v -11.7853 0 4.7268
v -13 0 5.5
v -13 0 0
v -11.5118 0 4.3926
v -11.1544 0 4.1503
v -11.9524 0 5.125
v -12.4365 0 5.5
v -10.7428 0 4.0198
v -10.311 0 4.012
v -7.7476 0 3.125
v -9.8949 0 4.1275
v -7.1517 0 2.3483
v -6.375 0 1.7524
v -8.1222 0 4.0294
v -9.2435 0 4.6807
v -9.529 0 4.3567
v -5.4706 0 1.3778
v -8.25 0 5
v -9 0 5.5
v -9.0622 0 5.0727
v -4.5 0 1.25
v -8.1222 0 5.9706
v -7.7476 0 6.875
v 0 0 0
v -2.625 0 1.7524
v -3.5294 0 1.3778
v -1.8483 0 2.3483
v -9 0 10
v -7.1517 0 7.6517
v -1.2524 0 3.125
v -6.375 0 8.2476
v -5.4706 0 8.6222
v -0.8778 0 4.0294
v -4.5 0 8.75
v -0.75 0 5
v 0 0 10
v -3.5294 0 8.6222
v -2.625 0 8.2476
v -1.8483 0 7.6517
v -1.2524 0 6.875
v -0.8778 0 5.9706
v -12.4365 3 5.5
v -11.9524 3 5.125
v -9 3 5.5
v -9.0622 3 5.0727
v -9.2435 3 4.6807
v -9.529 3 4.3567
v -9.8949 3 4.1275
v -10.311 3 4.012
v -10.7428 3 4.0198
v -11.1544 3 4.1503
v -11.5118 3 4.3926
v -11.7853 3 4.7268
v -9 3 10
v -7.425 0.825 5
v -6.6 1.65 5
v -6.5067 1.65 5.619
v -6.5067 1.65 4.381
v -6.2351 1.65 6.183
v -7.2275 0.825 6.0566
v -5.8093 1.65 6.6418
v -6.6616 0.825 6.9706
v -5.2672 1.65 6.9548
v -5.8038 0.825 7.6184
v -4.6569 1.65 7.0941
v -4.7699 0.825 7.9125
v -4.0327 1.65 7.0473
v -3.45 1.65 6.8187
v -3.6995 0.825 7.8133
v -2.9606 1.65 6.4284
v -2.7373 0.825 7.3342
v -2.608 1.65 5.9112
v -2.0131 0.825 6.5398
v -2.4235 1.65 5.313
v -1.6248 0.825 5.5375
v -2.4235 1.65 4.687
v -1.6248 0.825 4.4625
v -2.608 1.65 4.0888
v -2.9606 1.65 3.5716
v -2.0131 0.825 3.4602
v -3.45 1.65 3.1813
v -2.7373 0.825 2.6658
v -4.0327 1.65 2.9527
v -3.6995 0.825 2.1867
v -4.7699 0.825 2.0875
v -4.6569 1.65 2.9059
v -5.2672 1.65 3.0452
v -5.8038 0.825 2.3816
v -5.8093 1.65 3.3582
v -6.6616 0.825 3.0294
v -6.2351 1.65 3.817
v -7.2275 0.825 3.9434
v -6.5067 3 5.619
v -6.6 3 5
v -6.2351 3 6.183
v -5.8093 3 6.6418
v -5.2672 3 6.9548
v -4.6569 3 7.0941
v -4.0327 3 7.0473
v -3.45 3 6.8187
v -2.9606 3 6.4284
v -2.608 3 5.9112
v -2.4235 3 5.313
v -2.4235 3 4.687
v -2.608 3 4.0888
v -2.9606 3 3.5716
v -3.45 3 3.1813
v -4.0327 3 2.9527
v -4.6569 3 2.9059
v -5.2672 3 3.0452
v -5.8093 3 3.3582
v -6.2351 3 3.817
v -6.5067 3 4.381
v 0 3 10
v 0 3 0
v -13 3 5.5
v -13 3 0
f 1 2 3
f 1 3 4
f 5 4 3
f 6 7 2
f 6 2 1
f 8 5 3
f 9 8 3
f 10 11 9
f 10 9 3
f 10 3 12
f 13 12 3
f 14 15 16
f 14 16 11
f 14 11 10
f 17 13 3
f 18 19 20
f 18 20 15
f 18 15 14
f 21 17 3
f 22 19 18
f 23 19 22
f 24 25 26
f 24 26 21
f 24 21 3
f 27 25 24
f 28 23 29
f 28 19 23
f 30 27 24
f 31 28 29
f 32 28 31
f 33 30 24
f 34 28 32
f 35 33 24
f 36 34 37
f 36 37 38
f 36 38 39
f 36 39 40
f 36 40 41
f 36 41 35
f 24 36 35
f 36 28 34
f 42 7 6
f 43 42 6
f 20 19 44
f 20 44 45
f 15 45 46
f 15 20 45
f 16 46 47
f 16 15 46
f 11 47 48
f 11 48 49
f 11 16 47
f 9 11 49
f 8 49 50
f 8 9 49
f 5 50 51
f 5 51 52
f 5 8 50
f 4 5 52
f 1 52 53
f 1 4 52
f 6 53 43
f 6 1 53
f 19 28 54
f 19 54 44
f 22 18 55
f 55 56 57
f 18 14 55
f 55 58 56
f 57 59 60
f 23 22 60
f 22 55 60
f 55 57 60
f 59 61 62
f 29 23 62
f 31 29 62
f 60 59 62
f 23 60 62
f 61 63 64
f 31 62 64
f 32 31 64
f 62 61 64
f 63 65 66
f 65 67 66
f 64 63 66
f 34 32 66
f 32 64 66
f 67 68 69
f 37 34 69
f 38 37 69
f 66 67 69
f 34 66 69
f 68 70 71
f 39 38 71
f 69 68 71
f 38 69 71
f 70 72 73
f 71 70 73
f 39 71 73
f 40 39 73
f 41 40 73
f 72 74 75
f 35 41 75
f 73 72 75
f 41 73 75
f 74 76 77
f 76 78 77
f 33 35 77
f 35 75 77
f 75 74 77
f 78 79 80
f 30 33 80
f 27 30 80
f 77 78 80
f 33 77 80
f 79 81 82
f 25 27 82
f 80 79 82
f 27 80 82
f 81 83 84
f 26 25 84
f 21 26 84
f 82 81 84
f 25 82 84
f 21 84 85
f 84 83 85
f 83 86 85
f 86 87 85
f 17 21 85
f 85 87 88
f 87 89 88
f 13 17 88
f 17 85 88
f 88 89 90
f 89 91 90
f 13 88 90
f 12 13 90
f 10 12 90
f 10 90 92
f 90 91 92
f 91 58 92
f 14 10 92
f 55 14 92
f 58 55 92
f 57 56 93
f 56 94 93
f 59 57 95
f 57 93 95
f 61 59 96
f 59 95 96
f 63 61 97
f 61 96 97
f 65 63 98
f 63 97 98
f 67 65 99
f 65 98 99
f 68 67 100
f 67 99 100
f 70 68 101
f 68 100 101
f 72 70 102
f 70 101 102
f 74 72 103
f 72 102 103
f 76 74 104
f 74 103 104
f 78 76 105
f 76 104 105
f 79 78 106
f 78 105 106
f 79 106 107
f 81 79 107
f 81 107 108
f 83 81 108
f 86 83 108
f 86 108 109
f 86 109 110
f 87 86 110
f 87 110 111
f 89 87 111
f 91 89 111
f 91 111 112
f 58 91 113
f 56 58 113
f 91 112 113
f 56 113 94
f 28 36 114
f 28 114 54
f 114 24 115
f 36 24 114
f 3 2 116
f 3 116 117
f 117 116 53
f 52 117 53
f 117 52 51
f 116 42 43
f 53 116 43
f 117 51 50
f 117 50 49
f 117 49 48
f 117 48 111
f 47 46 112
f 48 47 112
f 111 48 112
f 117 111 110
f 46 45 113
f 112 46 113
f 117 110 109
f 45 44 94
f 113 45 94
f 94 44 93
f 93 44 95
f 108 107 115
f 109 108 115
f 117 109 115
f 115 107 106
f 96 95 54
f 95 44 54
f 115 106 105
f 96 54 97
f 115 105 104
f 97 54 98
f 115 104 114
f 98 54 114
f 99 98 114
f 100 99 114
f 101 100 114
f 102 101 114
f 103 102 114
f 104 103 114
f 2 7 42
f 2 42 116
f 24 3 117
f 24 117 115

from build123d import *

# Parameters (mm, degrees)
F1_DEPTH       = 3
F3_D           = 4.2
F3_CSINK_D     = 7.5
F3_CSINK_ANGLE = 90
F4_T1_DEPTH    = 5.2623442452


# Not quite as in the source:
# - a fillet or chamfer that OpenCascade refuses, or shapes differently, is made with other operations: its cross-section is extruded or revolved along the edge and cut away or added


with BuildPart() as f1:
    # F0 (on Front) → F1 (new body)
    with BuildSketch(Plane.XZ):
        with BuildLine():
            Line((-13, 0), (0, 0))
            Line((0, 0), (0, 10))
            Line((0, 10), (-9, 10))
            Line((-9, 10), (-9, 5.5))
            ThreePointArc((-9, 5.5), (-10.5, 4), (-12, 5.5))
            Line((-12, 5.5), (-13, 5.5))
            Line((-13, 5.5), (-13, 0))
        make_face()
    extrude(amount=-F1_DEPTH)

    # F3 (through all)
    with Locations(Plane.XZ):
        with Locations((-4.5, 5)):
            CounterSinkHole(F3_D / 2, F3_CSINK_D / 2, counter_sink_angle=F3_CSINK_ANGLE)

    # F4: chamfer of 0.5 on 1 edges, made by hand

    # F4_s2 → F4_t1 (cut)
    with BuildSketch(Plane.XZ.offset(-4.1311721226)):
        with BuildLine():
            Line((-12.4364916731, 5.5), (-11.9523687548, 5.125))
            ThreePointArc((-11.9523687548, 5.125), (-11.9871251619, 5.3038909672), (-12, 5.5))
            Line((-12, 5.5), (-12.4364916731, 5.5))
        make_face()
    extrude(amount=F4_T1_DEPTH, mode=Mode.SUBTRACT)


solid = f1.part
